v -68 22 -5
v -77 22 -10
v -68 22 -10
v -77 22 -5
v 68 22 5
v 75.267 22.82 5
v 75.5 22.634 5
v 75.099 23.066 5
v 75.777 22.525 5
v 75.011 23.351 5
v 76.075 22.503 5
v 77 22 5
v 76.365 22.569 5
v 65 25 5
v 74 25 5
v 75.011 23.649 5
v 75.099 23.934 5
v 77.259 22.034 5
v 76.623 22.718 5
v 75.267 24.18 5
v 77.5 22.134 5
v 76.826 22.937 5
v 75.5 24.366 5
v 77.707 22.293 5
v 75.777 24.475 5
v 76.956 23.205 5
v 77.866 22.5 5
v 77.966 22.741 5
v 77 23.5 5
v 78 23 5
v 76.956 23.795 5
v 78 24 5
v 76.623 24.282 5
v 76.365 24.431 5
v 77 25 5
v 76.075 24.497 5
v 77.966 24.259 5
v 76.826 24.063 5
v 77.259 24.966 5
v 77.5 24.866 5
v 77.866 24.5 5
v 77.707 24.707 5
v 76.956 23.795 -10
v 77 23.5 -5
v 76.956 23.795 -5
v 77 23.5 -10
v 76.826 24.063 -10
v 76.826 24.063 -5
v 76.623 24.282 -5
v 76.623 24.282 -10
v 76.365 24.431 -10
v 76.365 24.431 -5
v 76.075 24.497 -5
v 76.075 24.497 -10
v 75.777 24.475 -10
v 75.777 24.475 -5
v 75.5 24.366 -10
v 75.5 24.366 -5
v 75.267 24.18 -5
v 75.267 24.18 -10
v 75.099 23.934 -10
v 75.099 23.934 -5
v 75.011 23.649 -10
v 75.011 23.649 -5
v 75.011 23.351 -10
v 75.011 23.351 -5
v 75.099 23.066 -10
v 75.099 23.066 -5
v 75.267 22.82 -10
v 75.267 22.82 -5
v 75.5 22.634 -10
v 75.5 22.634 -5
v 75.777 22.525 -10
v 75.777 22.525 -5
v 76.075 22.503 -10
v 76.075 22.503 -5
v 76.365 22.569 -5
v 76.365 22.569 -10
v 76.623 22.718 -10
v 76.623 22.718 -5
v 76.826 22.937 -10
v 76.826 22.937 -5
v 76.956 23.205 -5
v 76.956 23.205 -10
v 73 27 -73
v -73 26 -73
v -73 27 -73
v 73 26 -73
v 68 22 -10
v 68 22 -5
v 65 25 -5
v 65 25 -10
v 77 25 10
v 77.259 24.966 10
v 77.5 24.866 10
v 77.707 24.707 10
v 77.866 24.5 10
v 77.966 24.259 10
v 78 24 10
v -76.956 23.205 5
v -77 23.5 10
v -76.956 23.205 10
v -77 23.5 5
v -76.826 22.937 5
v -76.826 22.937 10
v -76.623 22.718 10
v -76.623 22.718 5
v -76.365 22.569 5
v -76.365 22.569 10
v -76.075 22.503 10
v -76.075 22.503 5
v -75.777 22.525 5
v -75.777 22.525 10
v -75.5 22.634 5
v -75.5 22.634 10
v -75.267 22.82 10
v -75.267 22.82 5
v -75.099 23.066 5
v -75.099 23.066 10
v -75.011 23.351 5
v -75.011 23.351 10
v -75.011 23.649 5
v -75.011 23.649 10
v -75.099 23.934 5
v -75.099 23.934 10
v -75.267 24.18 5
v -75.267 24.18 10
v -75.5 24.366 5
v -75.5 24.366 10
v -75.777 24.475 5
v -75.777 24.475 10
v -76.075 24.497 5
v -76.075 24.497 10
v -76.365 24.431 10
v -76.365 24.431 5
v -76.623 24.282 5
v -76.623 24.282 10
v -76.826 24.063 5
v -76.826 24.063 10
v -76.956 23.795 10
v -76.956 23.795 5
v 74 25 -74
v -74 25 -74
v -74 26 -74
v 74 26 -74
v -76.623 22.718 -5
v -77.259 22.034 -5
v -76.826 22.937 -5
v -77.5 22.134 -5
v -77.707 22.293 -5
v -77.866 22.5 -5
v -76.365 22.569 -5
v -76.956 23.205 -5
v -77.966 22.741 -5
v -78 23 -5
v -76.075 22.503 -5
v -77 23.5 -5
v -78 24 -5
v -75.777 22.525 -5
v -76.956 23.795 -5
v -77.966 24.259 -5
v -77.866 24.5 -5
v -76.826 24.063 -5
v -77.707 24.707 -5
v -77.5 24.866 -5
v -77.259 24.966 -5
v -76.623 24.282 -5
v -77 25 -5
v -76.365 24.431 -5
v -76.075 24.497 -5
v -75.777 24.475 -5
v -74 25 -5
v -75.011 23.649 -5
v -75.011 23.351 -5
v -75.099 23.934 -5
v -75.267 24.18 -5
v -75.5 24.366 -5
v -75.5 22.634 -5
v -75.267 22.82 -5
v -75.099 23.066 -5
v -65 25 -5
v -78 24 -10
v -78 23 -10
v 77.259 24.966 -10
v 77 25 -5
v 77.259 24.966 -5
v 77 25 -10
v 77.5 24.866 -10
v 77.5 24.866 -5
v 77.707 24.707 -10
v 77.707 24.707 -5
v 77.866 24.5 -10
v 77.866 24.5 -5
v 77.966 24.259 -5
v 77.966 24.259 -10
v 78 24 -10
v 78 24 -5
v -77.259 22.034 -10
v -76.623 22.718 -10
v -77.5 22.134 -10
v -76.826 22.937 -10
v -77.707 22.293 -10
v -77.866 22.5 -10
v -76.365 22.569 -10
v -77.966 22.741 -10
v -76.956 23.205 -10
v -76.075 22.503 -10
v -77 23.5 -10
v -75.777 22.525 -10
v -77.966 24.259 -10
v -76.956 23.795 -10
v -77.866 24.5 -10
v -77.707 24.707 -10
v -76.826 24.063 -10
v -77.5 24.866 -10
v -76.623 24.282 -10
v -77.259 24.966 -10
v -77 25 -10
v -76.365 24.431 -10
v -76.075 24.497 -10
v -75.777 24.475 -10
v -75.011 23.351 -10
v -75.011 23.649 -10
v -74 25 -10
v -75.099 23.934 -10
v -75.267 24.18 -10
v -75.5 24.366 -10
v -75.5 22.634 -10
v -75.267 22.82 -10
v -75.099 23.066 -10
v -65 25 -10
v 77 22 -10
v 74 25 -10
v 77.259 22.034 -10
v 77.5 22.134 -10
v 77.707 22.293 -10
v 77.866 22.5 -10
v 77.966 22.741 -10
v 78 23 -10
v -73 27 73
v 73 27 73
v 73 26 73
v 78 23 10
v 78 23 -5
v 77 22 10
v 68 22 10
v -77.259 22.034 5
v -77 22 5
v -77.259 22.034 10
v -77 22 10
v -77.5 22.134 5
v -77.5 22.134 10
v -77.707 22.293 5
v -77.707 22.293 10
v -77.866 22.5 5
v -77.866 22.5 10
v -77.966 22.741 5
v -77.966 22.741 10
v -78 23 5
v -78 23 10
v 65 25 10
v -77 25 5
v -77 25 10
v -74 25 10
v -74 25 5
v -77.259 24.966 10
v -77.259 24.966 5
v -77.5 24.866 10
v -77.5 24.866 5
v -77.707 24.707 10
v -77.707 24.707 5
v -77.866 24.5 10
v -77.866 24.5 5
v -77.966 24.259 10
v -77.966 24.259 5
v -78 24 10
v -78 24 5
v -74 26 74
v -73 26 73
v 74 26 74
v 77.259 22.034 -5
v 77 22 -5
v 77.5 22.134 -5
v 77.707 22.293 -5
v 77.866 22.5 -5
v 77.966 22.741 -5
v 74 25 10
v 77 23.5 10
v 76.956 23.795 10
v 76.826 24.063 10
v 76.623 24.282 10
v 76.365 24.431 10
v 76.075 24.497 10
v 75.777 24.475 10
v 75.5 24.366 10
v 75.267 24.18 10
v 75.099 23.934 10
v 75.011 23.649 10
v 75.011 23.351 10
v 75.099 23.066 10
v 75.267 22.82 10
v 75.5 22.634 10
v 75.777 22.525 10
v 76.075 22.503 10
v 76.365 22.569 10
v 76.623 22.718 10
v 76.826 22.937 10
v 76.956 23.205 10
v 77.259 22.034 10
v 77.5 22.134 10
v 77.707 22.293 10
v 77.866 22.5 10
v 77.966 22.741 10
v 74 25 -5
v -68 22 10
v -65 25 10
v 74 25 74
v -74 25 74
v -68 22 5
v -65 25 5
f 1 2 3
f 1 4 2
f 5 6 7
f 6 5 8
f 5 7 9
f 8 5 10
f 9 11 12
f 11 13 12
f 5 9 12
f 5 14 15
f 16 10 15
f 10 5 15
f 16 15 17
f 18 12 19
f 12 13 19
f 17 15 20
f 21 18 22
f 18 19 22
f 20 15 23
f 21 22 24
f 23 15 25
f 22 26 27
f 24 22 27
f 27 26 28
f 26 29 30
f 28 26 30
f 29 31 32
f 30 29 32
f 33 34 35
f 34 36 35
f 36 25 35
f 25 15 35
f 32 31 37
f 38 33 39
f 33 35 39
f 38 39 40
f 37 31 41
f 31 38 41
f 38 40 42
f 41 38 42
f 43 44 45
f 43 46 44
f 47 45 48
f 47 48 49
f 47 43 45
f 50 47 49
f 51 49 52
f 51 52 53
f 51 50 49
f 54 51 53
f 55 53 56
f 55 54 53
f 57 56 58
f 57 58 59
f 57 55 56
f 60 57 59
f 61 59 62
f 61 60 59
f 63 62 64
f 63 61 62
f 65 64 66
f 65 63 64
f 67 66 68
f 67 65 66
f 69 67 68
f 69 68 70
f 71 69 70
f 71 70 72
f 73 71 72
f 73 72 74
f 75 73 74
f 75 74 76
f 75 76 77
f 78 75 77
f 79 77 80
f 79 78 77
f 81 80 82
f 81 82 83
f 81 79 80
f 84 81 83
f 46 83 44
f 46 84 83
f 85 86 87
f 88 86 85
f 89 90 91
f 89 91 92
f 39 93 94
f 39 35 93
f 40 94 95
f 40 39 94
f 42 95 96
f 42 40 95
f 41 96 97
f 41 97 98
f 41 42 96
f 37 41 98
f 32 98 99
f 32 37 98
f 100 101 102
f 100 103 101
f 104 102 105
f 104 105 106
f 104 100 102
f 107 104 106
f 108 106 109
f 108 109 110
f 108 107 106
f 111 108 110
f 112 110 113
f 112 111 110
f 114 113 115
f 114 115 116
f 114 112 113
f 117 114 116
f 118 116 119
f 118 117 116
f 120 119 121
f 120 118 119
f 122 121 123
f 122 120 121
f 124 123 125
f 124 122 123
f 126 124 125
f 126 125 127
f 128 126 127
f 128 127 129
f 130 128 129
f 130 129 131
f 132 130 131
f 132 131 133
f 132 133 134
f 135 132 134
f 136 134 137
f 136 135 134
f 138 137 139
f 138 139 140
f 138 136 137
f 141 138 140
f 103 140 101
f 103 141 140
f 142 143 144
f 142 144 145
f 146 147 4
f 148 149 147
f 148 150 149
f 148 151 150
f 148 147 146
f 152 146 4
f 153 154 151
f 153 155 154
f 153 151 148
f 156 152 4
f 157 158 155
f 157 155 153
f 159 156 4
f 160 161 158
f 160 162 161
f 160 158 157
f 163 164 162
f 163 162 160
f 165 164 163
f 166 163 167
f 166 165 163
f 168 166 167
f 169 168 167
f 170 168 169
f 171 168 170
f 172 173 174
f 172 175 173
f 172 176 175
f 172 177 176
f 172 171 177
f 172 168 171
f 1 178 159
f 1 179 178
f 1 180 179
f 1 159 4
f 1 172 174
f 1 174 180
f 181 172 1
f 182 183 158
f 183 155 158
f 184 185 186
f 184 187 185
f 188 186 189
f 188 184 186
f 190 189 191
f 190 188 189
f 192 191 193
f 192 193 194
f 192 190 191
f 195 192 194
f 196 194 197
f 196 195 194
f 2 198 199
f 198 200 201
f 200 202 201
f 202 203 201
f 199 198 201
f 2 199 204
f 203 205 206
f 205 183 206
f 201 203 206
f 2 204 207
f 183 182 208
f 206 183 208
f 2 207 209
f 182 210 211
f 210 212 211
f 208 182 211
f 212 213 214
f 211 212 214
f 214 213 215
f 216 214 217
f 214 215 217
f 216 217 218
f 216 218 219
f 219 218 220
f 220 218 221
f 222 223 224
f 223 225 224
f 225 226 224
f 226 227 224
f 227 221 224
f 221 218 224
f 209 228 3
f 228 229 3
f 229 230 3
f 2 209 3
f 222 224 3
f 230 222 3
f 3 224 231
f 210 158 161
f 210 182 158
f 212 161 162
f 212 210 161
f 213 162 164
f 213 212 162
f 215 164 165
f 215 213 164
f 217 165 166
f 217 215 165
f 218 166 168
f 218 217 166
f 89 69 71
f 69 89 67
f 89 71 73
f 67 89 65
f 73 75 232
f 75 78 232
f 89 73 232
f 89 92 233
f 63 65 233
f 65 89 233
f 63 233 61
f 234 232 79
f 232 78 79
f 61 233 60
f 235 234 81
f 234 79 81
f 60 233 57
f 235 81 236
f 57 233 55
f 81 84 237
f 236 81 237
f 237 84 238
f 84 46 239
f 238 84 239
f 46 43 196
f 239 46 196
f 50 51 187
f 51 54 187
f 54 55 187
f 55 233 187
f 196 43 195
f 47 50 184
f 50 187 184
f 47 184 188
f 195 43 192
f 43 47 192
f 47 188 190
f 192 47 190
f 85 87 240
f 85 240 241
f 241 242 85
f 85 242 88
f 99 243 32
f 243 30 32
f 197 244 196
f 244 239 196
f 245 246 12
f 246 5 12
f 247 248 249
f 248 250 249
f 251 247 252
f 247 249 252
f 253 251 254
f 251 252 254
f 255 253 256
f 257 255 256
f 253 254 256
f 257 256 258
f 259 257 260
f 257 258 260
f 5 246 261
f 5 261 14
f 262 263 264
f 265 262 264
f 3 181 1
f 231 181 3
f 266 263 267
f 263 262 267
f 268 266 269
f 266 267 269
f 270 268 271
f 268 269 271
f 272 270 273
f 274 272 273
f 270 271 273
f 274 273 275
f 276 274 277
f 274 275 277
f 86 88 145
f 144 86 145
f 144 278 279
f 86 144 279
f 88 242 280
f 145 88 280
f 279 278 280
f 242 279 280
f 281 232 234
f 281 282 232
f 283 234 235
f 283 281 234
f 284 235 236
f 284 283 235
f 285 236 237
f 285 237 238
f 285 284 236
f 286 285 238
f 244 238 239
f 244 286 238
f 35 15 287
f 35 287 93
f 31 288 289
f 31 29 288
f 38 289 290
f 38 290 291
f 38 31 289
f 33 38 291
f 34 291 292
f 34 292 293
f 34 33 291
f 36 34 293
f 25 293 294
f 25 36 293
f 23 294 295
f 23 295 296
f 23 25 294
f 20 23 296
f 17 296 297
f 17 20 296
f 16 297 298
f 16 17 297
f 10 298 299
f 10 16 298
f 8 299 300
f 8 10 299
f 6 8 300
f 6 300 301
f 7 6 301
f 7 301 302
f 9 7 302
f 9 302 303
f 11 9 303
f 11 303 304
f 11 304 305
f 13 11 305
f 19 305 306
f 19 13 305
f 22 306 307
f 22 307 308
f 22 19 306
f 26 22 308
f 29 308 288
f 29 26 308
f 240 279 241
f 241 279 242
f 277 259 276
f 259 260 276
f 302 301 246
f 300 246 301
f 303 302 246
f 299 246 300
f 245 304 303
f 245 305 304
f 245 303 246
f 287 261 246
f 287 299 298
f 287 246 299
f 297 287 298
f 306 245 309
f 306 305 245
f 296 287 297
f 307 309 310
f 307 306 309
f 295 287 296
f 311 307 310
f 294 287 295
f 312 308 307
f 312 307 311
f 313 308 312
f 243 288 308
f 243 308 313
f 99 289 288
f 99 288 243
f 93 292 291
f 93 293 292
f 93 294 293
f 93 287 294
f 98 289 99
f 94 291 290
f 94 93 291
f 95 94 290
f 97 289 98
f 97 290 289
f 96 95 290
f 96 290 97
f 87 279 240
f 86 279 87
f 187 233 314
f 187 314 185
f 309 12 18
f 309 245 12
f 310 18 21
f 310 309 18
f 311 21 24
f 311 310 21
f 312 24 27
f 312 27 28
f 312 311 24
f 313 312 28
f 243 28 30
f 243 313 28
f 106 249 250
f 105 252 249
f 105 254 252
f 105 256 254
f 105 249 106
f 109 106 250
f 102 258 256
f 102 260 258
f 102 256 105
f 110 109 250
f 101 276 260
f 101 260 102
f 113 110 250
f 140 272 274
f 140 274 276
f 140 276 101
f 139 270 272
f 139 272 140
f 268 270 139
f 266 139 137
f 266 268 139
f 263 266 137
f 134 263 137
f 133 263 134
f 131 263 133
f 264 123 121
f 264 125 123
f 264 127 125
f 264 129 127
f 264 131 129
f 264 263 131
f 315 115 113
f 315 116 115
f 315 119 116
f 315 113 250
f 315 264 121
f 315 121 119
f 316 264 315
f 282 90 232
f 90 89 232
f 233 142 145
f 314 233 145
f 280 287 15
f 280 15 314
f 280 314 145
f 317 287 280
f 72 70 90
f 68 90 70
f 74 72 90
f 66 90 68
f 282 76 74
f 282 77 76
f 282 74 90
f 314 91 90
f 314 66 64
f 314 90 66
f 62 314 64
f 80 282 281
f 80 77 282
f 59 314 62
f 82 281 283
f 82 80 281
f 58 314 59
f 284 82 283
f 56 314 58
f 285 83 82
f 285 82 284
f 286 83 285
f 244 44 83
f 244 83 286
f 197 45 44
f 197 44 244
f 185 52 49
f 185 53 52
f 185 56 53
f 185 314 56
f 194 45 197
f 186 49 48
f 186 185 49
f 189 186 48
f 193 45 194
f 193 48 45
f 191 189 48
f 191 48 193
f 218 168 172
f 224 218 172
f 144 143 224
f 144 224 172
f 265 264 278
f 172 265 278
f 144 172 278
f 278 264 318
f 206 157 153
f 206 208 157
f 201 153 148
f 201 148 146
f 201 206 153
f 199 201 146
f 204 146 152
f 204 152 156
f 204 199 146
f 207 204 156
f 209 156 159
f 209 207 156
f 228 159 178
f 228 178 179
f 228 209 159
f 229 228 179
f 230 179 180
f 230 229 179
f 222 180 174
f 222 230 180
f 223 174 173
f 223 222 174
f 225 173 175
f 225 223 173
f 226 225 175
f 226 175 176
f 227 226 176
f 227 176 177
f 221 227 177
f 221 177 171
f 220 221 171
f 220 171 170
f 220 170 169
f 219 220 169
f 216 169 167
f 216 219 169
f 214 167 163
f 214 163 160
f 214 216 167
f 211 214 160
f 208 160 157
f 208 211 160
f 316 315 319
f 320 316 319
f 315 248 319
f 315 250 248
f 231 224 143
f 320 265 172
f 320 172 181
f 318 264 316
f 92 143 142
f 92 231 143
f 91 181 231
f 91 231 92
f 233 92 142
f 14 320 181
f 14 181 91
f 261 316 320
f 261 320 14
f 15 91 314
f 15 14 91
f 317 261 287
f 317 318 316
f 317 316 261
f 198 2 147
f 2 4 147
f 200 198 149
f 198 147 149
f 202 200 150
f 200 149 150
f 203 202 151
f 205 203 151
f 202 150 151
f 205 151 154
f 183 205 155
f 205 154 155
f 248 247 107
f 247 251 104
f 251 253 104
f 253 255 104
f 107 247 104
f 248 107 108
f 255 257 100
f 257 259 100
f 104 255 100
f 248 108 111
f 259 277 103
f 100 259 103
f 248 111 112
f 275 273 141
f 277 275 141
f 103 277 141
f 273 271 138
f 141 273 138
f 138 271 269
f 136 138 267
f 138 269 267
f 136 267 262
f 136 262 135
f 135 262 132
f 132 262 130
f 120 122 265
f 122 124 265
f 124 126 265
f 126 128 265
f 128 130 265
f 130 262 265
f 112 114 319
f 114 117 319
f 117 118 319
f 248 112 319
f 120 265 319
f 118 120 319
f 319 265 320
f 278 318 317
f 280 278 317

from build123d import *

# Parameters (mm, degrees)
SKETCH1_R           = 10
SKETCH1_R_2         = 7.5
BOSS_EXTRUDE1_DEPTH = 25
THREAD1_PITCH       = 0.3175
SKETCH4_W           = 146
SKETCH4_H           = 146
BOSS_EXTRUDE2_DEPTH = 2
SKETCH5_W           = 148
SKETCH5_H           = 148
BOSS_EXTRUDE3_DEPTH = 1
BOSS_EXTRUDE4_START = 7.5
SKETCH6_W           = 10
SKETCH6_H           = 3
SKETCH6_R           = 1
BOSS_EXTRUDE4_DEPTH = 2.5
BOSS_EXTRUDE5_START = -7.5
SKETCH6_2_W         = 10
SKETCH6_2_H         = 3
SKETCH6_2_R         = 1
BOSS_EXTRUDE5_DEPTH = 2.5
SKETCH9_R           = 18.995637602
CUT_EXTRUDE1_DEPTH  = 111.385687501
CHAMFER1_SIZE       = 3
FILLET1_R           = 1


with BuildPart() as part:
    # Sketch1 → Boss-Extrude1 (new body)
    with BuildSketch(Plane(origin=(0, 0, 0), x_dir=(1, 0, 0), z_dir=(0, 1, 0))):
        with Locations(Location((0, 0, 0), (0, 0, 270))):
            Circle(SKETCH1_R)
        with Locations(Location((0, 0, 0), (0, 0, 270))):
            Circle(SKETCH1_R_2, mode=Mode.SUBTRACT)
    extrude(amount=BOSS_EXTRUDE1_DEPTH)

    # Thread1: the profile of Thread Profile1 profile screwed along a right-hand helix of 18.897638 turns, 6 arcs to a turn; built about Z, then put on its axis
    thread1_z = Axis((0, 0, 0), (0, 0, 1))
    thread1_corners = [(10.0003, 0, -0.000173205), (10.0003, 0, 0.277985704), (9.828148085, 0, 0.17859375), (9.828148085, 0, 0.09921875)]
    with BuildLine(mode=Mode.PRIVATE) as thread1_profile:
        Line(thread1_corners[0], thread1_corners[1])
        Line(thread1_corners[1], thread1_corners[2])
        Line(thread1_corners[2], thread1_corners[3])
        Line(thread1_corners[3], thread1_corners[0])
    thread1_cap = Face(thread1_profile.wire())
    thread1_turn_angles = [0, 30, 60, 90, 120, 150, 180, 210, 240, 270, 300, 330, 360]
    thread1_turn_weights = [1, 0.8660254037844387, 1, 0.8660254037844387, 1, 0.8660254037844387, 1, 0.8660254037844387, 1, 0.8660254037844387, 1, 0.8660254037844387, 1]
    thread1_turn_rails = [Edge.make_bspline([Vector(p[0], p[1], 0).rotate(thread1_z, thread1_turn_angles[k]) / thread1_turn_weights[k] + Vector(0, 0, p[2] + THREAD1_PITCH * thread1_turn_angles[k] / 360) for k in range(13)], [0, 0, 0, 1, 1, 2, 2, 3, 3, 4, 4, 5, 5, 6, 6, 6], 2, thread1_turn_weights) for p in thread1_corners]
    thread1_turn_sides = [Face.make_surface_from_curves(thread1_turn_rails[p[0]], thread1_turn_rails[p[1]]) for p in [(0, 1), (1, 2), (2, 3), (3, 0)]]
    thread1_last_angles = [6480, 6510, 6540, 6570, 6600, 6630, 6660, 6690, 6720, 6750, 6780, 6791.57480315, 6803.149606299]
    thread1_last_weights = [1, 0.8660254037844387, 1, 0.8660254037844387, 1, 0.8660254037844387, 1, 0.8660254037844387, 1, 0.8660254037844387, 1, 0.9796635825089068, 1]
    thread1_last_rails = [Edge.make_bspline([Vector(p[0], p[1], 0).rotate(thread1_z, thread1_last_angles[k]) / thread1_last_weights[k] + Vector(0, 0, p[2] + THREAD1_PITCH * thread1_last_angles[k] / 360) for k in range(13)], [0, 0, 0, 1, 1, 2, 2, 3, 3, 4, 4, 5, 5, 6, 6, 6], 2, thread1_last_weights) for p in thread1_corners]
    thread1_last_sides = [Face.make_surface_from_curves(thread1_last_rails[p[0]], thread1_last_rails[p[1]]) for p in [(0, 1), (1, 2), (2, 3), (3, 0)]]
    thread1 = Plane(origin=(0, -0.5, 0), x_dir=(1, 0, 0), z_dir=(0, 1, 0)) * Solid(Shell([*[p.moved(Location((0, 0, THREAD1_PITCH * i))) for i in range(18) for p in thread1_turn_sides], *thread1_last_sides, thread1_cap, thread1_cap.rotate(thread1_z, 6803.149606299).moved(Location((0, 0, THREAD1_PITCH * 6803.149606299 / 360)))]))
    add(thread1, mode=Mode.SUBTRACT)

    # Sketch4 → Boss-Extrude2 (add)
    with BuildSketch(Plane(origin=(0, 25, 0), x_dir=(1, 0, 0), z_dir=(0, 1, 0))):
        Rectangle(SKETCH4_W, SKETCH4_H)
    extrude(amount=BOSS_EXTRUDE2_DEPTH)

    # Sketch5 → Boss-Extrude3 (add)
    with BuildSketch(Plane.XZ.offset(-25)):
        Rectangle(SKETCH5_W, SKETCH5_H)
    extrude(amount=-BOSS_EXTRUDE3_DEPTH)

    # Sketch6 → Boss-Extrude4 (add, symmetric)
    # profile 1 of 2: a face of its own
    with BuildSketch(Plane.XY.offset(BOSS_EXTRUDE4_START)):
        with Locations((73, 23.5)):
            Rectangle(SKETCH6_W, SKETCH6_H)
        with Locations((76, 23.5)):
            Circle(SKETCH6_R, mode=Mode.SUBTRACT)
    # profile 2 of 2: a face of its own
    with BuildSketch(Plane.XY.offset(BOSS_EXTRUDE4_START)):
        with Locations((-73, 23.5)):
            Rectangle(SKETCH6_W, SKETCH6_H)
        with Locations(Location((-76, 23.5, 0), (0, 0, 180))):
            Circle(SKETCH6_R, mode=Mode.SUBTRACT)
    extrude(amount=BOSS_EXTRUDE4_DEPTH, both=True)

    # Sketch6<2> → Boss-Extrude5 (add, symmetric)
    # profile 1 of 2: a face of its own
    with BuildSketch(Plane.XY.offset(BOSS_EXTRUDE5_START)):
        with Locations((73, 23.5)):
            Rectangle(SKETCH6_2_W, SKETCH6_2_H)
        with Locations((76, 23.5)):
            Circle(SKETCH6_2_R, mode=Mode.SUBTRACT)
    # profile 2 of 2: a face of its own
    with BuildSketch(Plane.XY.offset(BOSS_EXTRUDE5_START)):
        with Locations((-73, 23.5)):
            Rectangle(SKETCH6_2_W, SKETCH6_2_H)
        with Locations(Location((-76, 23.5, 0), (0, 0, 180))):
            Circle(SKETCH6_2_R, mode=Mode.SUBTRACT)
    extrude(amount=BOSS_EXTRUDE5_DEPTH, both=True)

    # Sketch9 → Cut-Extrude1 (cut, through all)
    with BuildSketch(Plane.XZ.offset(-25)):
        Circle(SKETCH9_R)
    extrude(amount=CUT_EXTRUDE1_DEPTH, mode=Mode.SUBTRACT)

    # Chamfer1
    chamfer1_edges = [part.edges().sort_by_distance(p)[0] for p in [
        (68, 25, -7.5),
        (68, 25, 7.5),
        (-68, 25, -7.5),
        (-68, 25, 7.5),
    ]]
    chamfer(chamfer1_edges, length=CHAMFER1_SIZE - 0.0001)  # a hair under: the kernel refuses the full size

    # Fillet1
    fillet1_edges = [part.edges().sort_by_distance(p)[0] for p in [
        (78, 22, -7.5),
        (78, 25, -7.5),
        (-78, 25, -7.5),
        (-78, 22, -7.5),
        (78, 22, 7.5),
        (78, 25, 7.5),
        (-78, 25, 7.5),
        (-78, 22, 7.5),
    ]]
    fillet(fillet1_edges, radius=FILLET1_R)


solid = part.part
